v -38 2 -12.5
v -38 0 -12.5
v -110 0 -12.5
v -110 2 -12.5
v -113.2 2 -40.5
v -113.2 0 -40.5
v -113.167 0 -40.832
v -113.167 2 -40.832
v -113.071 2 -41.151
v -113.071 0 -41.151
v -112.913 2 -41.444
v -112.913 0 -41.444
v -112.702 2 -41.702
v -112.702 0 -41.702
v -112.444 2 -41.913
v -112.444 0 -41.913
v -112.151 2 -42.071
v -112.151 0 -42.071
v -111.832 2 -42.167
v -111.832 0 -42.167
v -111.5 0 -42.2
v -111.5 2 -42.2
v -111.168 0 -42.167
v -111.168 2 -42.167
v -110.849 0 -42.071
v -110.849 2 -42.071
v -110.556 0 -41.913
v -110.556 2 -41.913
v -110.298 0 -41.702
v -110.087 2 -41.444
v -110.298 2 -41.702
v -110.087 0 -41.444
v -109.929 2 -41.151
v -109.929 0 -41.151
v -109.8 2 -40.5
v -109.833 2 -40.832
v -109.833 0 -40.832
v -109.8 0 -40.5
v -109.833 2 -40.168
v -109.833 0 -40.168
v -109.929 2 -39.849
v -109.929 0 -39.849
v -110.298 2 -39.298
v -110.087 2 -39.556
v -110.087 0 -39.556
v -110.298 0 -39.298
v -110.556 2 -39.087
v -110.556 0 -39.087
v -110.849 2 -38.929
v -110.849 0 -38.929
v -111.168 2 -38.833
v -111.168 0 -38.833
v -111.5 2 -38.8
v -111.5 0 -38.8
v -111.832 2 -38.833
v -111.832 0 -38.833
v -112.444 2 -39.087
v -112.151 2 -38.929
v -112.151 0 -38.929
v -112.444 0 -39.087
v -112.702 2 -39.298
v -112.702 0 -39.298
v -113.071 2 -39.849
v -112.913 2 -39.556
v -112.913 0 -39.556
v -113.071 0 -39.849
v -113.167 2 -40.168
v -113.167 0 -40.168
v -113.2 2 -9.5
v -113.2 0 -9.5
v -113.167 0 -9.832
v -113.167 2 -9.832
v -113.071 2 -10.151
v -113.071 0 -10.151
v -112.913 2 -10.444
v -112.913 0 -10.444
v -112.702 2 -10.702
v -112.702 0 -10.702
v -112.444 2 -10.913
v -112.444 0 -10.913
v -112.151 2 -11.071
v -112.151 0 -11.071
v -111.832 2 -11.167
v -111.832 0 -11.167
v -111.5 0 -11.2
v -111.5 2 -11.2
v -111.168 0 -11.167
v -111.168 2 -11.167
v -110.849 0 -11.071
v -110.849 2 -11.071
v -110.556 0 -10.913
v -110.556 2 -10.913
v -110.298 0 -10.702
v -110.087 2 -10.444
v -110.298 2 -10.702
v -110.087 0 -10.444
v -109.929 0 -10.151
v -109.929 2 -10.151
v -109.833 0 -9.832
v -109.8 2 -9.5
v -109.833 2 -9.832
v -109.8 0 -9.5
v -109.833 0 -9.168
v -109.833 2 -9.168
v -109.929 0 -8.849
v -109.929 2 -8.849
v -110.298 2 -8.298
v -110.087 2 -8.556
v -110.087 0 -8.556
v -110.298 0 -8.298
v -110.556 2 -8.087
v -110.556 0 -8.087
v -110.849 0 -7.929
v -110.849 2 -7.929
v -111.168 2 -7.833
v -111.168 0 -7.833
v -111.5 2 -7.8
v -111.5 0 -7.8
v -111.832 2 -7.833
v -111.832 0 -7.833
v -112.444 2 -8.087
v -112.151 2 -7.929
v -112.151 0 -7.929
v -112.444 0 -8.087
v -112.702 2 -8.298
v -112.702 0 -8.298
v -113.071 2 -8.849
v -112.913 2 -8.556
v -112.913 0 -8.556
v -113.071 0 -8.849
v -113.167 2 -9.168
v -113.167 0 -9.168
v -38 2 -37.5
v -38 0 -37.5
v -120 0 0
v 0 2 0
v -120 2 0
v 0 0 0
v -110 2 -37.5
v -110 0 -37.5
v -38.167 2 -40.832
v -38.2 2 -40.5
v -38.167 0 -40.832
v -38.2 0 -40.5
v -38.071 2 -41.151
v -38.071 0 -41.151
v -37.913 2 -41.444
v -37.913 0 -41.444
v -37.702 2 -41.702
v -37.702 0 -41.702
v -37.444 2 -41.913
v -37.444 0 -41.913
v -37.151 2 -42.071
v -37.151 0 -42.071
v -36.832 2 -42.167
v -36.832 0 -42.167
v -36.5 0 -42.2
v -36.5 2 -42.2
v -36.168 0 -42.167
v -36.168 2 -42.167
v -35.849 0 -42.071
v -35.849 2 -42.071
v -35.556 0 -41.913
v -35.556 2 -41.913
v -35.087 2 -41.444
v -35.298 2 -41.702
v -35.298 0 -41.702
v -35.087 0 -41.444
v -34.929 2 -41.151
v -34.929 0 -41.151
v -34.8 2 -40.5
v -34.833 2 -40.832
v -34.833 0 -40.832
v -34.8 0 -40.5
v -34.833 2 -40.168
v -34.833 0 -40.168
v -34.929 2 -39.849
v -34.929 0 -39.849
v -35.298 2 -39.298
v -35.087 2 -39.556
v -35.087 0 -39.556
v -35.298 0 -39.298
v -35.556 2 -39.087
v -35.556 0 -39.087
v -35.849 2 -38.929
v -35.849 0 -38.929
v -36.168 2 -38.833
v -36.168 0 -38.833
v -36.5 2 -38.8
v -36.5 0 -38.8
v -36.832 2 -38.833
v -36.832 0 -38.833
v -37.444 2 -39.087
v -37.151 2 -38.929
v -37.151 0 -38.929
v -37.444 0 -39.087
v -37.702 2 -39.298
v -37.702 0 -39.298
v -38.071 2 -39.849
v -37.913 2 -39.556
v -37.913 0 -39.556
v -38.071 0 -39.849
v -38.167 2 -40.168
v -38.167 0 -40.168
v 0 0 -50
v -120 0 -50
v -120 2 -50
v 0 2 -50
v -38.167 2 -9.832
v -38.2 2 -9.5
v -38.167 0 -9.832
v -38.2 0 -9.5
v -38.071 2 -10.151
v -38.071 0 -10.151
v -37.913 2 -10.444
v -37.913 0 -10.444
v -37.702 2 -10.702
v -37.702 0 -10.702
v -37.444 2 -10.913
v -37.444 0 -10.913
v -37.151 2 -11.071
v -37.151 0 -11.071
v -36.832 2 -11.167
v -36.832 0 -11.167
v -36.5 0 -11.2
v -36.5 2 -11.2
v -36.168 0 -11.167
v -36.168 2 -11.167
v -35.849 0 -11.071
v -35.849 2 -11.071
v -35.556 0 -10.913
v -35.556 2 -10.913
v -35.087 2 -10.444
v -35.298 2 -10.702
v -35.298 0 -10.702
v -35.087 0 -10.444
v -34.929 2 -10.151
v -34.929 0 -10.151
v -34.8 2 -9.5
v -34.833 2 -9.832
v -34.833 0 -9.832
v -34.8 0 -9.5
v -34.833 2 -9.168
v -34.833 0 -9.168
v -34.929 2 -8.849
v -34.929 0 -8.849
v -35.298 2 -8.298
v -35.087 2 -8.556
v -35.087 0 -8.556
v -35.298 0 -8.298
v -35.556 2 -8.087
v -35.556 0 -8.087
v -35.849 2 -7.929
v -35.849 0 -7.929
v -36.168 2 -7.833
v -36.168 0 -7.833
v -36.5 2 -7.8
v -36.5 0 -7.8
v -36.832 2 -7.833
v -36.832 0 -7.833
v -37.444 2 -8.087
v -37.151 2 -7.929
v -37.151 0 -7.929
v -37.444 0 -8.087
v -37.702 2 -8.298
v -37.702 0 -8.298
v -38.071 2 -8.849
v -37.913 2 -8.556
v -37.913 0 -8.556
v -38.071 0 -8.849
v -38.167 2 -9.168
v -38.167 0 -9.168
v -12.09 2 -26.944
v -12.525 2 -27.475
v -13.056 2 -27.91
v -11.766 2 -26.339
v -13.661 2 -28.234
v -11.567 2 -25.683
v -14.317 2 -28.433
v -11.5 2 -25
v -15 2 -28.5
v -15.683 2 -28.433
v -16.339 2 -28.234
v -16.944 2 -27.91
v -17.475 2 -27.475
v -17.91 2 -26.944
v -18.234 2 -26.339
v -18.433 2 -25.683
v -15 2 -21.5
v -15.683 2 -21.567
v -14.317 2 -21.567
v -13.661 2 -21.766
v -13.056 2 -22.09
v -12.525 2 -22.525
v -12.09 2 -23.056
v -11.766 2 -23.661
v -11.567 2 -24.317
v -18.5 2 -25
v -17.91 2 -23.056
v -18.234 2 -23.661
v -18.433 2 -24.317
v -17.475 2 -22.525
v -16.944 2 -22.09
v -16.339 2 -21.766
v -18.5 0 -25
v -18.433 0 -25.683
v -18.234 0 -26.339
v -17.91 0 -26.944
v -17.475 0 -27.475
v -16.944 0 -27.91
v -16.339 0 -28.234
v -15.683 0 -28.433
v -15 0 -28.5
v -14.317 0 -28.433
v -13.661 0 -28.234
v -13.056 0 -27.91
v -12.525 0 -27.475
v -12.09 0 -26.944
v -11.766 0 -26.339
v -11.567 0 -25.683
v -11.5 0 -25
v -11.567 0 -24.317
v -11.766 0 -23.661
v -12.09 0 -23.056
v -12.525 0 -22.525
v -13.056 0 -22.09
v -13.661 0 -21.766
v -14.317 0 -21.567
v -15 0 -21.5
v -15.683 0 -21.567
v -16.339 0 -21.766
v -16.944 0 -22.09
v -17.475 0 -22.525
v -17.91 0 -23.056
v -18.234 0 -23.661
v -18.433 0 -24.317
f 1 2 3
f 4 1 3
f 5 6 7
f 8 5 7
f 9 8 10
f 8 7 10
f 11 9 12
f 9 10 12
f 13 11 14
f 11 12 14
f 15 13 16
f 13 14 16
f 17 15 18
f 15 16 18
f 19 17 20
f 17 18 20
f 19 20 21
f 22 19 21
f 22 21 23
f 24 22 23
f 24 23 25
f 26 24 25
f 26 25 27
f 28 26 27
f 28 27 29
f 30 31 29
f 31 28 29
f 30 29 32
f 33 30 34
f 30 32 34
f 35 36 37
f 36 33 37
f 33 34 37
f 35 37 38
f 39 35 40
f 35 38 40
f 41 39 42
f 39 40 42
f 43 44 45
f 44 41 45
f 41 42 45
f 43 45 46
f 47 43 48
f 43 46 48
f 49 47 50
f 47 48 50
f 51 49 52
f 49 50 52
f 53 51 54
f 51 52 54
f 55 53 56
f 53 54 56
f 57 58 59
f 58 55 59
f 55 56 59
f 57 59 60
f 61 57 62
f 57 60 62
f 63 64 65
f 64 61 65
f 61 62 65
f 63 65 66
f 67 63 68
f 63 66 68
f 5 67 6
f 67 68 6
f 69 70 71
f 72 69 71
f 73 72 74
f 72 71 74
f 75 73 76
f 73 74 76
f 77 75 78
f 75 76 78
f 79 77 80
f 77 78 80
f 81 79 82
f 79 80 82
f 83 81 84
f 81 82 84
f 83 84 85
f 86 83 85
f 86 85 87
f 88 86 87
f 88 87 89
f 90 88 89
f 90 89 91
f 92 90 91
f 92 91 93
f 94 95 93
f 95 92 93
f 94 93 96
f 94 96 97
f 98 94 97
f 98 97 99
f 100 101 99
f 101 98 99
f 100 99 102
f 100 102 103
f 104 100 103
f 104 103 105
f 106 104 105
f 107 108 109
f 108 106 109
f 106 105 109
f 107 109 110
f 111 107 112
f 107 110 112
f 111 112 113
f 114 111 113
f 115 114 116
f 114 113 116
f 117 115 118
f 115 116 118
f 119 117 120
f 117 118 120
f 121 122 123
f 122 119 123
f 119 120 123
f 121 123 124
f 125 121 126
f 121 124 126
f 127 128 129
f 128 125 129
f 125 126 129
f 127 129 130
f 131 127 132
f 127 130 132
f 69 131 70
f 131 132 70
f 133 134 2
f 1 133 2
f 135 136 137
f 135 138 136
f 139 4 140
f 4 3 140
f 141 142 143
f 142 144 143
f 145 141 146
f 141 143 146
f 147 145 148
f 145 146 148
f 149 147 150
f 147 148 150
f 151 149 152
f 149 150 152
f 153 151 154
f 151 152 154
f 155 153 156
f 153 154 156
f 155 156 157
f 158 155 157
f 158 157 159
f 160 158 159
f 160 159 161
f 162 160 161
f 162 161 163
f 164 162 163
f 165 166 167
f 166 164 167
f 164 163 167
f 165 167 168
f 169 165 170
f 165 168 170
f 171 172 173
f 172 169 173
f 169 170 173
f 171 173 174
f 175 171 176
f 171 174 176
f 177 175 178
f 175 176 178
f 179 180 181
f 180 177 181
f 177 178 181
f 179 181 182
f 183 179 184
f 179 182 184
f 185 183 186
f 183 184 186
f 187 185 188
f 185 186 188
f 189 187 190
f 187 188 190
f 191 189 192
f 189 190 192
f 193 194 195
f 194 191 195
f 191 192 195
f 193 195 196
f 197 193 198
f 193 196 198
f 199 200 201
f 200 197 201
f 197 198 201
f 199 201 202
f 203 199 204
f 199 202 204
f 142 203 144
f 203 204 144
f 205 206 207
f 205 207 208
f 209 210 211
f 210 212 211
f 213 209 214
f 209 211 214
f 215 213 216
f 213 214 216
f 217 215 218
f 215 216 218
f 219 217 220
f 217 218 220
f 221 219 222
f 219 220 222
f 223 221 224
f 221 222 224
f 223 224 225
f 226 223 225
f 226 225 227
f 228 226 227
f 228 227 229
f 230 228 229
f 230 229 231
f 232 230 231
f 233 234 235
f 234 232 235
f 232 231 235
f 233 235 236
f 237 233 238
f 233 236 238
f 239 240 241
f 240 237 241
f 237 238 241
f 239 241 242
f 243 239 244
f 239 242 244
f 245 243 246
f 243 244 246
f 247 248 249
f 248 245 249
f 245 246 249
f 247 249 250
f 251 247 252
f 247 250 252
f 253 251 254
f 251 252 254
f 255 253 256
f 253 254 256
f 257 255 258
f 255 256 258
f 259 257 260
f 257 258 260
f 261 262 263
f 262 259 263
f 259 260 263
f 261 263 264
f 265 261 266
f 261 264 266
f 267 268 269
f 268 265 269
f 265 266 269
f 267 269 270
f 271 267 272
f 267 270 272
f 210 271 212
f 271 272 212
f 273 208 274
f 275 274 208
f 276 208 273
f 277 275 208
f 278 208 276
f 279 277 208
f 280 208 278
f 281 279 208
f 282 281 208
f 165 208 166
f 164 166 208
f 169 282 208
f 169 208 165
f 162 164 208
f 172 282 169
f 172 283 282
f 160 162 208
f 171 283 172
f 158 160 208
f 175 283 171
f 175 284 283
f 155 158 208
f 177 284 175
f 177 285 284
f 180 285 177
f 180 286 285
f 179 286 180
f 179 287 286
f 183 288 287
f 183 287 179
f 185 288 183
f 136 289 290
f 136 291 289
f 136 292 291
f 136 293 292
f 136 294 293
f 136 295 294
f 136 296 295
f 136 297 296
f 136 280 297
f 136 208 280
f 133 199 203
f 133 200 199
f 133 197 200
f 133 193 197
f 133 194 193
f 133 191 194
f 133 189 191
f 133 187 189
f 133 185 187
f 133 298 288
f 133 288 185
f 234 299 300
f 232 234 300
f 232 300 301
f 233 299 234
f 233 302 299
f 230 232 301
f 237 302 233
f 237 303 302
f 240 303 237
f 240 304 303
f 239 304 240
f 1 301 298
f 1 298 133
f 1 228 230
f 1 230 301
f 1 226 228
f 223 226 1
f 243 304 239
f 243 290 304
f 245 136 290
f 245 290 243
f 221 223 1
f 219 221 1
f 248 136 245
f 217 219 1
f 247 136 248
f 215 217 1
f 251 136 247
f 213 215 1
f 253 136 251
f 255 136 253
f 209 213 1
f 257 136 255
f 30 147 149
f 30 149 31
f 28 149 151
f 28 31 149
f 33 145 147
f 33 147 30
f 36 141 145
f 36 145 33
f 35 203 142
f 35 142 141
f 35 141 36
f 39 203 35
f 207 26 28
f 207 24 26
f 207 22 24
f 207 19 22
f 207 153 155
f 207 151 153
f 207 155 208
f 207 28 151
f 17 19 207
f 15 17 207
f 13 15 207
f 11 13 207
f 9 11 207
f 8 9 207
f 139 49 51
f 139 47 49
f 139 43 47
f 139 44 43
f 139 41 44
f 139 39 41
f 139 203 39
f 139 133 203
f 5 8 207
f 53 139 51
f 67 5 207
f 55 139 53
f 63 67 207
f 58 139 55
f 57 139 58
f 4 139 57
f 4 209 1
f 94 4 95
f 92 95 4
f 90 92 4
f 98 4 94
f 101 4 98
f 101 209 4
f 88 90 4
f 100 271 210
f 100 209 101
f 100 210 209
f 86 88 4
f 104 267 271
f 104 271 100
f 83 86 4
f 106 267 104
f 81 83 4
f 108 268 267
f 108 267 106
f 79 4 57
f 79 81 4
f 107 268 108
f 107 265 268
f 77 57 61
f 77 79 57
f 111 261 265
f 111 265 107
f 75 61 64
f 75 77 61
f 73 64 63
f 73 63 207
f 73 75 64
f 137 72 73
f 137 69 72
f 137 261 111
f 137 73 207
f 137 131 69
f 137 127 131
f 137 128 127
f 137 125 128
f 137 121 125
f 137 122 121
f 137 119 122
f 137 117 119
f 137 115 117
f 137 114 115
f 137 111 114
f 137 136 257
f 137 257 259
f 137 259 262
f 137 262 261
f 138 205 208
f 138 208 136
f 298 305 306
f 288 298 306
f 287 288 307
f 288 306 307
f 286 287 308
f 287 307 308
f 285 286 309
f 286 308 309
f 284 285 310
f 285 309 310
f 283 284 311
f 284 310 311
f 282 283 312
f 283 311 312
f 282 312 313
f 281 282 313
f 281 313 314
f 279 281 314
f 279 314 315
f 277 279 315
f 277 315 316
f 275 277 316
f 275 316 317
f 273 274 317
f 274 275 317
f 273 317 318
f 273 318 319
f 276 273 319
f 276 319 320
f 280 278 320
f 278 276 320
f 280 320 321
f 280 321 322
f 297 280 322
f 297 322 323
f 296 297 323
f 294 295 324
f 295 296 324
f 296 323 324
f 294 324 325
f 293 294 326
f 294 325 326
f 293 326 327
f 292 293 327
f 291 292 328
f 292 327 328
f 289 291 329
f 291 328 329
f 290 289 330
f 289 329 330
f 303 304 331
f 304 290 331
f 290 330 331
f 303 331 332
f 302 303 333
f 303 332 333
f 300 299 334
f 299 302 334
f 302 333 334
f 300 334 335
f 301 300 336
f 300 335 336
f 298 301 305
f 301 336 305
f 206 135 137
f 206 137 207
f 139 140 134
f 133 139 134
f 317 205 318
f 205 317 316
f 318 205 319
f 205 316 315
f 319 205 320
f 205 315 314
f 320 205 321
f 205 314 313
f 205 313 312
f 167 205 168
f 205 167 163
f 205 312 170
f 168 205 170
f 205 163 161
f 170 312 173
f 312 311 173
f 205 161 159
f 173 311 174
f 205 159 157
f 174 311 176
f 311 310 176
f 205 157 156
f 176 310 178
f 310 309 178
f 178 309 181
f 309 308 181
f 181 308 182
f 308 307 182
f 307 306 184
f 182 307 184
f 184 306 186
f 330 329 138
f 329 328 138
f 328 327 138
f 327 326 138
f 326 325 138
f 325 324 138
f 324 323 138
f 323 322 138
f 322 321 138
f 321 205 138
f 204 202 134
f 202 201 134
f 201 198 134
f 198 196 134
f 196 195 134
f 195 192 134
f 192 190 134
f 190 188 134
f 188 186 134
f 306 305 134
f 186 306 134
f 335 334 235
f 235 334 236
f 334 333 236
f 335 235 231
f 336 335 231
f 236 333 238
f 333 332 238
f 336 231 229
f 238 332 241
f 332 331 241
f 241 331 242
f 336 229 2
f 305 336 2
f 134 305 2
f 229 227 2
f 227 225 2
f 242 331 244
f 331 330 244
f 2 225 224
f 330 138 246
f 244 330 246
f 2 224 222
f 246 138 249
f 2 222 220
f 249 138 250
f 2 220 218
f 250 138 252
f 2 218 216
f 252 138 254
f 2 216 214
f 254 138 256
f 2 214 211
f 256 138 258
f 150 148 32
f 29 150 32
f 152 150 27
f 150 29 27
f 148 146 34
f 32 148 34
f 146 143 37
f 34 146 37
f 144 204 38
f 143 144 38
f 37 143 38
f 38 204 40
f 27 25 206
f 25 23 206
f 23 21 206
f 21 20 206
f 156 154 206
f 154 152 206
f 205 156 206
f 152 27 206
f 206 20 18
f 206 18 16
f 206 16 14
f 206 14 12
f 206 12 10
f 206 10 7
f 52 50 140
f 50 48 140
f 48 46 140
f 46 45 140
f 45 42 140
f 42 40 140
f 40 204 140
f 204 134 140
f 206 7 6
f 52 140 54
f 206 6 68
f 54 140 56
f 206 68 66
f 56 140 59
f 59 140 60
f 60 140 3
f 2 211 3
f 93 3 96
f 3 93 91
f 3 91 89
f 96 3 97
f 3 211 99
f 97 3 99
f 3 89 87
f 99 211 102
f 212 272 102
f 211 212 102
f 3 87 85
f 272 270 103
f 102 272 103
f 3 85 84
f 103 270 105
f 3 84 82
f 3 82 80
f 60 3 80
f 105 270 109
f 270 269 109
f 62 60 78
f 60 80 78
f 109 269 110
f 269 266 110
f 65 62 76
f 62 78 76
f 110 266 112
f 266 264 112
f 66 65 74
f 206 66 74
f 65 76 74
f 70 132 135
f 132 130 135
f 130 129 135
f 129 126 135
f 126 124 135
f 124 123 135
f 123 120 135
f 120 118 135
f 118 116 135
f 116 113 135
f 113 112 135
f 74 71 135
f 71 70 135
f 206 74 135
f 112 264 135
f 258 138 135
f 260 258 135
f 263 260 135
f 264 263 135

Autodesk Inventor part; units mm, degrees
ref_plane "YZ Plane" through (0, 0, 0) normal (1, 0, 0) x (0, 1, 0)
ref_plane "XZ Plane" through (0, 0, 0) normal (0, 1, 0) x (-1, 0, 0)
ref_plane "XY Plane" through (0, 0, 0) normal (0, 0, 1) x (1, 0, 0)
sketch "Skizze1" plane through (0, 0, 0) normal (0, 1, 0) x (-1, 0, 0)
  line L0 (0, 0) -> (120, 0)
  line L1 (120, 0) -> (120, -50)
  line L2 (120, -50) -> (0, -50)
  line L3 (0, -50) -> (0, 0)
  line L4 (110, -37.5) -> (38, -37.5)
  line L5 (38, -37.5) -> (38, -12.5)
  line L6 (38, -12.5) -> (110, -12.5)
  line L7 (110, -12.5) -> (110, -37.5)
  line L8 (114, -43) -> (34, -43)
  line L9 (34, -43) -> (34, -7)
  line L10 (34, -7) -> (114, -7)
  line L11 (114, -7) -> (114, -43)
  circle A0 centre (111.5, -40.5) radius 1.7
  circle A1 centre (36.5, -40.5) radius 1.7
  circle A2 centre (111.5, -9.5) radius 1.7
  circle A3 centre (36.5, -9.5) radius 1.7
  circle A4 centre (15, -25) radius 3.5
  dimension "d0" = 120
  dimension "d1" = 50
  dimension "d2" = 72
  dimension "d3" = 25
  dimension "d4" = 80
  dimension "d5" = 36
  dimension "d6" = 5.5
  dimension "d7" = 5.5
  dimension "d8" = 4
  dimension "d9" = 4
  dimension "d10" = 3.4
  dimension "d11" = 3.4
  dimension "d12" = 75
  dimension "d13" = 2.5
  dimension "d14" = 2.5
  dimension "d15" = 3.4
  dimension "d16" = 3.4
  dimension "d17" = 2.5
  dimension "d18" = 2.5
  dimension "d19" = 31
  dimension "d20" = 2.5
  dimension "d21" = 2.5
  dimension "d22" = 2.5
  dimension "d23" = 7
  dimension "d24" = 7
  dimension "d25" = 15
  dimension "d26" = 6
extrude "Extrusion1" add sketch "Skizze1" along normal blind 2 contours L0 L1 L2 L3 | L8 L9 L10 L11
equation "\"d10\" = d15"
equation "\"d11\" = d15"
equation "\"d16\" = d15"
equation "\"Biegeradius\" = Stärke"
equation "\"BreiteBiegungsfreistellung\" = Stärke"
equation "\"TiefeBiegungsfreistellung\" = 0.5 * Stärke"
equation "\"GrößeEckenfreistellung\" = 4 * Stärke"
equation "\"MinimalRest\" = 2 * Stärke"
equation "\"Übergangsradius\" = Biegeradius"
equation "\"JacobiRadiusGröße\" = Biegeradius"
equation "\"Abstandsgröße\" = Stärke"
equation "\"Stärke\" = 0.5"
properties part number "Bedienfeld"
